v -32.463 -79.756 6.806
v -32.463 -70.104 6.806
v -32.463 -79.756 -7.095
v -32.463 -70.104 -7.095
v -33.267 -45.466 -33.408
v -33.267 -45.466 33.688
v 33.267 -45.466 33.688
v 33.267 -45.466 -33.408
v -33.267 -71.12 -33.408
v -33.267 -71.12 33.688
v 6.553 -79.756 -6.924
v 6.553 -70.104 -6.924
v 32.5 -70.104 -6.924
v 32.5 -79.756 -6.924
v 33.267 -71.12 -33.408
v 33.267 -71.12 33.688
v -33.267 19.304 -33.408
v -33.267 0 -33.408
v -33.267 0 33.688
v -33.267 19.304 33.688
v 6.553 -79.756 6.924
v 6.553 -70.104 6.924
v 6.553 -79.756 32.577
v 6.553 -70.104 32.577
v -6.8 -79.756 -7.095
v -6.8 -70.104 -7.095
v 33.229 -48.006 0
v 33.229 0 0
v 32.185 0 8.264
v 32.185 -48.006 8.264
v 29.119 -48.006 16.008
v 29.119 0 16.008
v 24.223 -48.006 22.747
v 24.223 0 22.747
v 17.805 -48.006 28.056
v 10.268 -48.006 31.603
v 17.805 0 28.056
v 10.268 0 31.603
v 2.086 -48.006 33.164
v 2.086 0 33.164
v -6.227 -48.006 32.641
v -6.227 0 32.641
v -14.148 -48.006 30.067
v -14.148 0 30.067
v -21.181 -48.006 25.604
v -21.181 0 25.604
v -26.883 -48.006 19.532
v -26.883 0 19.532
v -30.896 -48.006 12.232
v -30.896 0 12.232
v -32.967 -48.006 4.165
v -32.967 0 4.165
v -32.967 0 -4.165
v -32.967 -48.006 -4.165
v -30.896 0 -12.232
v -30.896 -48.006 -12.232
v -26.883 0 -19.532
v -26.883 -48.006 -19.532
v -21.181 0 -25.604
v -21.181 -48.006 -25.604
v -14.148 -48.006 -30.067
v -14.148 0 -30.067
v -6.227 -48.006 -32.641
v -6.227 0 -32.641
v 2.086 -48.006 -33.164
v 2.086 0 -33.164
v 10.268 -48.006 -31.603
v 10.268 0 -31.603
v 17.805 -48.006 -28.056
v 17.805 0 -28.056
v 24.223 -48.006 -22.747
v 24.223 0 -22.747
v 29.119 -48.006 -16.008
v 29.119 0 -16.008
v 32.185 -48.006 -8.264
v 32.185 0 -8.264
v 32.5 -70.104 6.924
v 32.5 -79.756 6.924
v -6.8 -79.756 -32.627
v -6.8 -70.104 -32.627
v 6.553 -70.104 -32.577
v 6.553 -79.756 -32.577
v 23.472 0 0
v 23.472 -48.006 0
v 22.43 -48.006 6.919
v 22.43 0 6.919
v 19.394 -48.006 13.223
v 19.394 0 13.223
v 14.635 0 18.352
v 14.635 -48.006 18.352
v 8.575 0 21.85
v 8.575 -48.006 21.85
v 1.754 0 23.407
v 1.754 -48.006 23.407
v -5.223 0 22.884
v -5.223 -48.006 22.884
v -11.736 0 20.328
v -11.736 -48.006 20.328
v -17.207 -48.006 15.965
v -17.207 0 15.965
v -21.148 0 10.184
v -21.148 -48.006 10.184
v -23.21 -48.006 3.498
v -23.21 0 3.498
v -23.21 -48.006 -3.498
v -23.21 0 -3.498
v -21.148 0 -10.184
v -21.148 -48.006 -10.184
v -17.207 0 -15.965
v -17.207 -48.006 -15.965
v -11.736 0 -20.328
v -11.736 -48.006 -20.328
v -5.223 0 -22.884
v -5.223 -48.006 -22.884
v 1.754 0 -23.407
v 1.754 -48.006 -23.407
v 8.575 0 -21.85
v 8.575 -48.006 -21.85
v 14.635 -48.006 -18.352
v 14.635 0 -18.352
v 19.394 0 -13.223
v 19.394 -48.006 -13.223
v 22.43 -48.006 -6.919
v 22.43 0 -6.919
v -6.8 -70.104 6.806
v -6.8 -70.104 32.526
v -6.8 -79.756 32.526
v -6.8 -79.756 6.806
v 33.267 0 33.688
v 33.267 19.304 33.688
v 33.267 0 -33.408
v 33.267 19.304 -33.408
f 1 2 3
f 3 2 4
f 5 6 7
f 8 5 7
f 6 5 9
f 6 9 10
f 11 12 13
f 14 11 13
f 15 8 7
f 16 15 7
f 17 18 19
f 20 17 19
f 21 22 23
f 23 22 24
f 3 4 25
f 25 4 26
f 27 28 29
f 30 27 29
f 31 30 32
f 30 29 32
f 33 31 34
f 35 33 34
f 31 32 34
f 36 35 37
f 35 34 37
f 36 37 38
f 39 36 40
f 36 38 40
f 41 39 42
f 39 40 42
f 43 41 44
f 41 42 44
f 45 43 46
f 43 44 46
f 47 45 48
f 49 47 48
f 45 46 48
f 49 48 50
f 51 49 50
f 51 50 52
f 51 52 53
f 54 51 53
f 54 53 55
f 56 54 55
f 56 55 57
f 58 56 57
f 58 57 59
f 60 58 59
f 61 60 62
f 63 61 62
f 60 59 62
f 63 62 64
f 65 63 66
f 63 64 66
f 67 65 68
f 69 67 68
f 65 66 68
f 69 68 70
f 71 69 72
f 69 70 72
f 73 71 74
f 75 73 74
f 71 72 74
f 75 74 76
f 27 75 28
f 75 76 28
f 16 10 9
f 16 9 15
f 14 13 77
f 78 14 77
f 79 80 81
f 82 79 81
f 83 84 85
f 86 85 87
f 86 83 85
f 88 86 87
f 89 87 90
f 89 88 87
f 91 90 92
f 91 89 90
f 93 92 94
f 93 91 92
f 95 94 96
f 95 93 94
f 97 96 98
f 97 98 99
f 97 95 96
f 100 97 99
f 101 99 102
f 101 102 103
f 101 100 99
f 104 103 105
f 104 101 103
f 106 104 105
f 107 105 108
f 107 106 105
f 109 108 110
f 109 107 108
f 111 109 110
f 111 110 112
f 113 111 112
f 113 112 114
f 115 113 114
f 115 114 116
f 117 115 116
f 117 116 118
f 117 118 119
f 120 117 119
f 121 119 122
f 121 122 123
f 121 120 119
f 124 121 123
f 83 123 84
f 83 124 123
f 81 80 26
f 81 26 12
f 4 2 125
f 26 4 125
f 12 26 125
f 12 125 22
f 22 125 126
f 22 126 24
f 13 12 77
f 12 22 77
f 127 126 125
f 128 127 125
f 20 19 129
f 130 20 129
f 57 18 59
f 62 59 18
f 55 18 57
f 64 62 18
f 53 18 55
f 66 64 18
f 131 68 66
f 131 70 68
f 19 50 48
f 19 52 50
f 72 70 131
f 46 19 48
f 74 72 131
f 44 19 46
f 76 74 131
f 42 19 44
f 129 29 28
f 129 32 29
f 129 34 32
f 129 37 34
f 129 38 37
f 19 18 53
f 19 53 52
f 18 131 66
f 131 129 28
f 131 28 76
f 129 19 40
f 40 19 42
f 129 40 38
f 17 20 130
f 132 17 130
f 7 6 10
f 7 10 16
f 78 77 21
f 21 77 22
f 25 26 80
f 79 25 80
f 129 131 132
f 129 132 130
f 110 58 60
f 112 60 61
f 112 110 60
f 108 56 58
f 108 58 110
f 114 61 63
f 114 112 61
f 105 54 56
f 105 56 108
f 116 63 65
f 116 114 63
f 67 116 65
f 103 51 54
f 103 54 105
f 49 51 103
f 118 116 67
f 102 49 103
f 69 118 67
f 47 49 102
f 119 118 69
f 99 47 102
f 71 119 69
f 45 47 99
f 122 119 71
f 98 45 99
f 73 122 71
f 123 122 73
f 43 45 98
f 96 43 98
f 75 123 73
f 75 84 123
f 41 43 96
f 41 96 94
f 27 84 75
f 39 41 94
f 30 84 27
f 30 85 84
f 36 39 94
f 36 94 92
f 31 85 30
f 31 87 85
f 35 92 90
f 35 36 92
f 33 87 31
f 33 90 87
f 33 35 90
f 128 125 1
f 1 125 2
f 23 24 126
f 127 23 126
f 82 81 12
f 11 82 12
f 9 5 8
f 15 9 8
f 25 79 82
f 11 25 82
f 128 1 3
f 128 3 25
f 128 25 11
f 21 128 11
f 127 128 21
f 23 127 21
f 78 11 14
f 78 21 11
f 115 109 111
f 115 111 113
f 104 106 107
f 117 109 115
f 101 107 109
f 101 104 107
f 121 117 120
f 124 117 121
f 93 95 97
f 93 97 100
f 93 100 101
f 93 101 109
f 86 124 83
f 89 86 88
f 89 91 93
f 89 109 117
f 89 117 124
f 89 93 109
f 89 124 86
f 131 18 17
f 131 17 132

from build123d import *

# Parameters (mm, degrees)
F0_R     = 33.229204682
F0_R_2   = 23.4724850114
F1_DEPTH = 48.006
F2_W     = 66.5346346796
F2_H     = 67.0961048454
F3_DEPTH = 19.304
F5_START = 22.098
F5_DEPTH = 9.652
F6_START = 45.466
F6_DEPTH = 25.654


with BuildPart() as f1:
    # F0 (on Front) → F1 (new body)
    with BuildSketch(Plane.XZ):
        Circle(F0_R)
        Circle(F0_R_2, mode=Mode.SUBTRACT)
    extrude(amount=F1_DEPTH)

    # F2 (on face) → F3 (join)
    with BuildSketch(Plane.XZ):
        with Locations((-1.8626e-06, 0.1403680071)):
            Rectangle(F2_W, F2_H)
    extrude(amount=-F3_DEPTH)


with BuildPart() as f5:
    # F4 (on face) → F5 (new body)
    with BuildSketch(Plane.XZ.offset(48.006).offset(F5_START)):
        Polygon((-6.8002606187, -7.0948041975), (-6.8002606187, -32.6273733594), (6.5529856074, -32.576654577), (6.5529856074, -6.9235055707), (32.499924837, -6.9235055707), (32.499924837, 6.9235055707), (6.5529856074, 6.9235055707), (6.5529856074, 32.576654577), (-6.8002606187, 32.5259357947), (-6.8002606187, 6.8058026955), (-32.4629603887, 6.8058026955), (-32.4629603887, -7.0948041975), align=None)
    extrude(amount=F5_DEPTH)


with BuildPart() as f6:
    # F2 (on face) → F6 (new body)
    with BuildSketch(Plane.XZ.offset(F6_START)):
        with Locations((-1.8626e-06, 0.1403680071)):
            Rectangle(F2_W, F2_H)
    extrude(amount=F6_DEPTH)


solid = Compound([f1.part, f5.part, f6.part])
